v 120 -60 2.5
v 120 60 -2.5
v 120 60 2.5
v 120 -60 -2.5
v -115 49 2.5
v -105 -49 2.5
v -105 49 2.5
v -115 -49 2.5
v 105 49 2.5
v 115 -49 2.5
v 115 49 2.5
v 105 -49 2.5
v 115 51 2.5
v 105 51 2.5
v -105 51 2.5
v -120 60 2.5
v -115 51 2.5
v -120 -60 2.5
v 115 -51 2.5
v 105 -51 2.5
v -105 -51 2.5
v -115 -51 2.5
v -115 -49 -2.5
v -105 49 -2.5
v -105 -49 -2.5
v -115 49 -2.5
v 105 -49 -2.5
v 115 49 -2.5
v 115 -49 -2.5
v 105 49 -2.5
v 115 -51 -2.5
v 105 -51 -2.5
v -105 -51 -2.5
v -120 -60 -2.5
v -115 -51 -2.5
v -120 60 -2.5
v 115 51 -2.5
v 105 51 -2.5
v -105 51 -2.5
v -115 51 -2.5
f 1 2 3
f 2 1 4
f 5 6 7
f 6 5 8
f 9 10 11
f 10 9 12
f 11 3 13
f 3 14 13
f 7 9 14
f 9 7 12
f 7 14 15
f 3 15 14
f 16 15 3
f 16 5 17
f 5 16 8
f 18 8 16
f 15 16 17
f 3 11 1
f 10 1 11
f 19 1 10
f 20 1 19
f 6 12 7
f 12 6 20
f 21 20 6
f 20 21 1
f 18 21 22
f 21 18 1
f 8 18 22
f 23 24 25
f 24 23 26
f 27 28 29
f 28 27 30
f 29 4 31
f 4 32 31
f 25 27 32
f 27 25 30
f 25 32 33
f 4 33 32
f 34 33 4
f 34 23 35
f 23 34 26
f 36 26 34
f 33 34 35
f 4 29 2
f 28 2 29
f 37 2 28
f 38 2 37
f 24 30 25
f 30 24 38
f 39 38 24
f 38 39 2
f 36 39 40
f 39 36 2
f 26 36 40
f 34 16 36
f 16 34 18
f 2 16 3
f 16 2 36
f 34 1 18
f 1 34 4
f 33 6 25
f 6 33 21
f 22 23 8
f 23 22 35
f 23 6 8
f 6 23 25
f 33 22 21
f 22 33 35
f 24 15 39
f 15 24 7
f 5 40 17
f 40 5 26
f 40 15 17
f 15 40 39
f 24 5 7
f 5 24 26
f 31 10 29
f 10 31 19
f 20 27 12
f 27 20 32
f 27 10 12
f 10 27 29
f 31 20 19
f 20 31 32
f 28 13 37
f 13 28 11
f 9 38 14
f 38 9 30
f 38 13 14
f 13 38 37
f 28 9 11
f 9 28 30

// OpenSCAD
// ========================================
// a 240 x 120 x 5 mm plate with four 10 x 2 mm slots
// NeuroCAD canonical IR; dimensions are millimetres
// ========================================
$fn = 48;

difference() {
  cube(size=[240, 120, 5], center=true);
  translate([-110, -50, 0]) {
    cube(size=[10, 2, 7], center=true);
  }
  translate([-110, 50, 0]) {
    cube(size=[10, 2, 7], center=true);
  }
  translate([110, -50, 0]) {
    cube(size=[10, 2, 7], center=true);
  }
  translate([110, 50, 0]) {
    cube(size=[10, 2, 7], center=true);
  }
}
